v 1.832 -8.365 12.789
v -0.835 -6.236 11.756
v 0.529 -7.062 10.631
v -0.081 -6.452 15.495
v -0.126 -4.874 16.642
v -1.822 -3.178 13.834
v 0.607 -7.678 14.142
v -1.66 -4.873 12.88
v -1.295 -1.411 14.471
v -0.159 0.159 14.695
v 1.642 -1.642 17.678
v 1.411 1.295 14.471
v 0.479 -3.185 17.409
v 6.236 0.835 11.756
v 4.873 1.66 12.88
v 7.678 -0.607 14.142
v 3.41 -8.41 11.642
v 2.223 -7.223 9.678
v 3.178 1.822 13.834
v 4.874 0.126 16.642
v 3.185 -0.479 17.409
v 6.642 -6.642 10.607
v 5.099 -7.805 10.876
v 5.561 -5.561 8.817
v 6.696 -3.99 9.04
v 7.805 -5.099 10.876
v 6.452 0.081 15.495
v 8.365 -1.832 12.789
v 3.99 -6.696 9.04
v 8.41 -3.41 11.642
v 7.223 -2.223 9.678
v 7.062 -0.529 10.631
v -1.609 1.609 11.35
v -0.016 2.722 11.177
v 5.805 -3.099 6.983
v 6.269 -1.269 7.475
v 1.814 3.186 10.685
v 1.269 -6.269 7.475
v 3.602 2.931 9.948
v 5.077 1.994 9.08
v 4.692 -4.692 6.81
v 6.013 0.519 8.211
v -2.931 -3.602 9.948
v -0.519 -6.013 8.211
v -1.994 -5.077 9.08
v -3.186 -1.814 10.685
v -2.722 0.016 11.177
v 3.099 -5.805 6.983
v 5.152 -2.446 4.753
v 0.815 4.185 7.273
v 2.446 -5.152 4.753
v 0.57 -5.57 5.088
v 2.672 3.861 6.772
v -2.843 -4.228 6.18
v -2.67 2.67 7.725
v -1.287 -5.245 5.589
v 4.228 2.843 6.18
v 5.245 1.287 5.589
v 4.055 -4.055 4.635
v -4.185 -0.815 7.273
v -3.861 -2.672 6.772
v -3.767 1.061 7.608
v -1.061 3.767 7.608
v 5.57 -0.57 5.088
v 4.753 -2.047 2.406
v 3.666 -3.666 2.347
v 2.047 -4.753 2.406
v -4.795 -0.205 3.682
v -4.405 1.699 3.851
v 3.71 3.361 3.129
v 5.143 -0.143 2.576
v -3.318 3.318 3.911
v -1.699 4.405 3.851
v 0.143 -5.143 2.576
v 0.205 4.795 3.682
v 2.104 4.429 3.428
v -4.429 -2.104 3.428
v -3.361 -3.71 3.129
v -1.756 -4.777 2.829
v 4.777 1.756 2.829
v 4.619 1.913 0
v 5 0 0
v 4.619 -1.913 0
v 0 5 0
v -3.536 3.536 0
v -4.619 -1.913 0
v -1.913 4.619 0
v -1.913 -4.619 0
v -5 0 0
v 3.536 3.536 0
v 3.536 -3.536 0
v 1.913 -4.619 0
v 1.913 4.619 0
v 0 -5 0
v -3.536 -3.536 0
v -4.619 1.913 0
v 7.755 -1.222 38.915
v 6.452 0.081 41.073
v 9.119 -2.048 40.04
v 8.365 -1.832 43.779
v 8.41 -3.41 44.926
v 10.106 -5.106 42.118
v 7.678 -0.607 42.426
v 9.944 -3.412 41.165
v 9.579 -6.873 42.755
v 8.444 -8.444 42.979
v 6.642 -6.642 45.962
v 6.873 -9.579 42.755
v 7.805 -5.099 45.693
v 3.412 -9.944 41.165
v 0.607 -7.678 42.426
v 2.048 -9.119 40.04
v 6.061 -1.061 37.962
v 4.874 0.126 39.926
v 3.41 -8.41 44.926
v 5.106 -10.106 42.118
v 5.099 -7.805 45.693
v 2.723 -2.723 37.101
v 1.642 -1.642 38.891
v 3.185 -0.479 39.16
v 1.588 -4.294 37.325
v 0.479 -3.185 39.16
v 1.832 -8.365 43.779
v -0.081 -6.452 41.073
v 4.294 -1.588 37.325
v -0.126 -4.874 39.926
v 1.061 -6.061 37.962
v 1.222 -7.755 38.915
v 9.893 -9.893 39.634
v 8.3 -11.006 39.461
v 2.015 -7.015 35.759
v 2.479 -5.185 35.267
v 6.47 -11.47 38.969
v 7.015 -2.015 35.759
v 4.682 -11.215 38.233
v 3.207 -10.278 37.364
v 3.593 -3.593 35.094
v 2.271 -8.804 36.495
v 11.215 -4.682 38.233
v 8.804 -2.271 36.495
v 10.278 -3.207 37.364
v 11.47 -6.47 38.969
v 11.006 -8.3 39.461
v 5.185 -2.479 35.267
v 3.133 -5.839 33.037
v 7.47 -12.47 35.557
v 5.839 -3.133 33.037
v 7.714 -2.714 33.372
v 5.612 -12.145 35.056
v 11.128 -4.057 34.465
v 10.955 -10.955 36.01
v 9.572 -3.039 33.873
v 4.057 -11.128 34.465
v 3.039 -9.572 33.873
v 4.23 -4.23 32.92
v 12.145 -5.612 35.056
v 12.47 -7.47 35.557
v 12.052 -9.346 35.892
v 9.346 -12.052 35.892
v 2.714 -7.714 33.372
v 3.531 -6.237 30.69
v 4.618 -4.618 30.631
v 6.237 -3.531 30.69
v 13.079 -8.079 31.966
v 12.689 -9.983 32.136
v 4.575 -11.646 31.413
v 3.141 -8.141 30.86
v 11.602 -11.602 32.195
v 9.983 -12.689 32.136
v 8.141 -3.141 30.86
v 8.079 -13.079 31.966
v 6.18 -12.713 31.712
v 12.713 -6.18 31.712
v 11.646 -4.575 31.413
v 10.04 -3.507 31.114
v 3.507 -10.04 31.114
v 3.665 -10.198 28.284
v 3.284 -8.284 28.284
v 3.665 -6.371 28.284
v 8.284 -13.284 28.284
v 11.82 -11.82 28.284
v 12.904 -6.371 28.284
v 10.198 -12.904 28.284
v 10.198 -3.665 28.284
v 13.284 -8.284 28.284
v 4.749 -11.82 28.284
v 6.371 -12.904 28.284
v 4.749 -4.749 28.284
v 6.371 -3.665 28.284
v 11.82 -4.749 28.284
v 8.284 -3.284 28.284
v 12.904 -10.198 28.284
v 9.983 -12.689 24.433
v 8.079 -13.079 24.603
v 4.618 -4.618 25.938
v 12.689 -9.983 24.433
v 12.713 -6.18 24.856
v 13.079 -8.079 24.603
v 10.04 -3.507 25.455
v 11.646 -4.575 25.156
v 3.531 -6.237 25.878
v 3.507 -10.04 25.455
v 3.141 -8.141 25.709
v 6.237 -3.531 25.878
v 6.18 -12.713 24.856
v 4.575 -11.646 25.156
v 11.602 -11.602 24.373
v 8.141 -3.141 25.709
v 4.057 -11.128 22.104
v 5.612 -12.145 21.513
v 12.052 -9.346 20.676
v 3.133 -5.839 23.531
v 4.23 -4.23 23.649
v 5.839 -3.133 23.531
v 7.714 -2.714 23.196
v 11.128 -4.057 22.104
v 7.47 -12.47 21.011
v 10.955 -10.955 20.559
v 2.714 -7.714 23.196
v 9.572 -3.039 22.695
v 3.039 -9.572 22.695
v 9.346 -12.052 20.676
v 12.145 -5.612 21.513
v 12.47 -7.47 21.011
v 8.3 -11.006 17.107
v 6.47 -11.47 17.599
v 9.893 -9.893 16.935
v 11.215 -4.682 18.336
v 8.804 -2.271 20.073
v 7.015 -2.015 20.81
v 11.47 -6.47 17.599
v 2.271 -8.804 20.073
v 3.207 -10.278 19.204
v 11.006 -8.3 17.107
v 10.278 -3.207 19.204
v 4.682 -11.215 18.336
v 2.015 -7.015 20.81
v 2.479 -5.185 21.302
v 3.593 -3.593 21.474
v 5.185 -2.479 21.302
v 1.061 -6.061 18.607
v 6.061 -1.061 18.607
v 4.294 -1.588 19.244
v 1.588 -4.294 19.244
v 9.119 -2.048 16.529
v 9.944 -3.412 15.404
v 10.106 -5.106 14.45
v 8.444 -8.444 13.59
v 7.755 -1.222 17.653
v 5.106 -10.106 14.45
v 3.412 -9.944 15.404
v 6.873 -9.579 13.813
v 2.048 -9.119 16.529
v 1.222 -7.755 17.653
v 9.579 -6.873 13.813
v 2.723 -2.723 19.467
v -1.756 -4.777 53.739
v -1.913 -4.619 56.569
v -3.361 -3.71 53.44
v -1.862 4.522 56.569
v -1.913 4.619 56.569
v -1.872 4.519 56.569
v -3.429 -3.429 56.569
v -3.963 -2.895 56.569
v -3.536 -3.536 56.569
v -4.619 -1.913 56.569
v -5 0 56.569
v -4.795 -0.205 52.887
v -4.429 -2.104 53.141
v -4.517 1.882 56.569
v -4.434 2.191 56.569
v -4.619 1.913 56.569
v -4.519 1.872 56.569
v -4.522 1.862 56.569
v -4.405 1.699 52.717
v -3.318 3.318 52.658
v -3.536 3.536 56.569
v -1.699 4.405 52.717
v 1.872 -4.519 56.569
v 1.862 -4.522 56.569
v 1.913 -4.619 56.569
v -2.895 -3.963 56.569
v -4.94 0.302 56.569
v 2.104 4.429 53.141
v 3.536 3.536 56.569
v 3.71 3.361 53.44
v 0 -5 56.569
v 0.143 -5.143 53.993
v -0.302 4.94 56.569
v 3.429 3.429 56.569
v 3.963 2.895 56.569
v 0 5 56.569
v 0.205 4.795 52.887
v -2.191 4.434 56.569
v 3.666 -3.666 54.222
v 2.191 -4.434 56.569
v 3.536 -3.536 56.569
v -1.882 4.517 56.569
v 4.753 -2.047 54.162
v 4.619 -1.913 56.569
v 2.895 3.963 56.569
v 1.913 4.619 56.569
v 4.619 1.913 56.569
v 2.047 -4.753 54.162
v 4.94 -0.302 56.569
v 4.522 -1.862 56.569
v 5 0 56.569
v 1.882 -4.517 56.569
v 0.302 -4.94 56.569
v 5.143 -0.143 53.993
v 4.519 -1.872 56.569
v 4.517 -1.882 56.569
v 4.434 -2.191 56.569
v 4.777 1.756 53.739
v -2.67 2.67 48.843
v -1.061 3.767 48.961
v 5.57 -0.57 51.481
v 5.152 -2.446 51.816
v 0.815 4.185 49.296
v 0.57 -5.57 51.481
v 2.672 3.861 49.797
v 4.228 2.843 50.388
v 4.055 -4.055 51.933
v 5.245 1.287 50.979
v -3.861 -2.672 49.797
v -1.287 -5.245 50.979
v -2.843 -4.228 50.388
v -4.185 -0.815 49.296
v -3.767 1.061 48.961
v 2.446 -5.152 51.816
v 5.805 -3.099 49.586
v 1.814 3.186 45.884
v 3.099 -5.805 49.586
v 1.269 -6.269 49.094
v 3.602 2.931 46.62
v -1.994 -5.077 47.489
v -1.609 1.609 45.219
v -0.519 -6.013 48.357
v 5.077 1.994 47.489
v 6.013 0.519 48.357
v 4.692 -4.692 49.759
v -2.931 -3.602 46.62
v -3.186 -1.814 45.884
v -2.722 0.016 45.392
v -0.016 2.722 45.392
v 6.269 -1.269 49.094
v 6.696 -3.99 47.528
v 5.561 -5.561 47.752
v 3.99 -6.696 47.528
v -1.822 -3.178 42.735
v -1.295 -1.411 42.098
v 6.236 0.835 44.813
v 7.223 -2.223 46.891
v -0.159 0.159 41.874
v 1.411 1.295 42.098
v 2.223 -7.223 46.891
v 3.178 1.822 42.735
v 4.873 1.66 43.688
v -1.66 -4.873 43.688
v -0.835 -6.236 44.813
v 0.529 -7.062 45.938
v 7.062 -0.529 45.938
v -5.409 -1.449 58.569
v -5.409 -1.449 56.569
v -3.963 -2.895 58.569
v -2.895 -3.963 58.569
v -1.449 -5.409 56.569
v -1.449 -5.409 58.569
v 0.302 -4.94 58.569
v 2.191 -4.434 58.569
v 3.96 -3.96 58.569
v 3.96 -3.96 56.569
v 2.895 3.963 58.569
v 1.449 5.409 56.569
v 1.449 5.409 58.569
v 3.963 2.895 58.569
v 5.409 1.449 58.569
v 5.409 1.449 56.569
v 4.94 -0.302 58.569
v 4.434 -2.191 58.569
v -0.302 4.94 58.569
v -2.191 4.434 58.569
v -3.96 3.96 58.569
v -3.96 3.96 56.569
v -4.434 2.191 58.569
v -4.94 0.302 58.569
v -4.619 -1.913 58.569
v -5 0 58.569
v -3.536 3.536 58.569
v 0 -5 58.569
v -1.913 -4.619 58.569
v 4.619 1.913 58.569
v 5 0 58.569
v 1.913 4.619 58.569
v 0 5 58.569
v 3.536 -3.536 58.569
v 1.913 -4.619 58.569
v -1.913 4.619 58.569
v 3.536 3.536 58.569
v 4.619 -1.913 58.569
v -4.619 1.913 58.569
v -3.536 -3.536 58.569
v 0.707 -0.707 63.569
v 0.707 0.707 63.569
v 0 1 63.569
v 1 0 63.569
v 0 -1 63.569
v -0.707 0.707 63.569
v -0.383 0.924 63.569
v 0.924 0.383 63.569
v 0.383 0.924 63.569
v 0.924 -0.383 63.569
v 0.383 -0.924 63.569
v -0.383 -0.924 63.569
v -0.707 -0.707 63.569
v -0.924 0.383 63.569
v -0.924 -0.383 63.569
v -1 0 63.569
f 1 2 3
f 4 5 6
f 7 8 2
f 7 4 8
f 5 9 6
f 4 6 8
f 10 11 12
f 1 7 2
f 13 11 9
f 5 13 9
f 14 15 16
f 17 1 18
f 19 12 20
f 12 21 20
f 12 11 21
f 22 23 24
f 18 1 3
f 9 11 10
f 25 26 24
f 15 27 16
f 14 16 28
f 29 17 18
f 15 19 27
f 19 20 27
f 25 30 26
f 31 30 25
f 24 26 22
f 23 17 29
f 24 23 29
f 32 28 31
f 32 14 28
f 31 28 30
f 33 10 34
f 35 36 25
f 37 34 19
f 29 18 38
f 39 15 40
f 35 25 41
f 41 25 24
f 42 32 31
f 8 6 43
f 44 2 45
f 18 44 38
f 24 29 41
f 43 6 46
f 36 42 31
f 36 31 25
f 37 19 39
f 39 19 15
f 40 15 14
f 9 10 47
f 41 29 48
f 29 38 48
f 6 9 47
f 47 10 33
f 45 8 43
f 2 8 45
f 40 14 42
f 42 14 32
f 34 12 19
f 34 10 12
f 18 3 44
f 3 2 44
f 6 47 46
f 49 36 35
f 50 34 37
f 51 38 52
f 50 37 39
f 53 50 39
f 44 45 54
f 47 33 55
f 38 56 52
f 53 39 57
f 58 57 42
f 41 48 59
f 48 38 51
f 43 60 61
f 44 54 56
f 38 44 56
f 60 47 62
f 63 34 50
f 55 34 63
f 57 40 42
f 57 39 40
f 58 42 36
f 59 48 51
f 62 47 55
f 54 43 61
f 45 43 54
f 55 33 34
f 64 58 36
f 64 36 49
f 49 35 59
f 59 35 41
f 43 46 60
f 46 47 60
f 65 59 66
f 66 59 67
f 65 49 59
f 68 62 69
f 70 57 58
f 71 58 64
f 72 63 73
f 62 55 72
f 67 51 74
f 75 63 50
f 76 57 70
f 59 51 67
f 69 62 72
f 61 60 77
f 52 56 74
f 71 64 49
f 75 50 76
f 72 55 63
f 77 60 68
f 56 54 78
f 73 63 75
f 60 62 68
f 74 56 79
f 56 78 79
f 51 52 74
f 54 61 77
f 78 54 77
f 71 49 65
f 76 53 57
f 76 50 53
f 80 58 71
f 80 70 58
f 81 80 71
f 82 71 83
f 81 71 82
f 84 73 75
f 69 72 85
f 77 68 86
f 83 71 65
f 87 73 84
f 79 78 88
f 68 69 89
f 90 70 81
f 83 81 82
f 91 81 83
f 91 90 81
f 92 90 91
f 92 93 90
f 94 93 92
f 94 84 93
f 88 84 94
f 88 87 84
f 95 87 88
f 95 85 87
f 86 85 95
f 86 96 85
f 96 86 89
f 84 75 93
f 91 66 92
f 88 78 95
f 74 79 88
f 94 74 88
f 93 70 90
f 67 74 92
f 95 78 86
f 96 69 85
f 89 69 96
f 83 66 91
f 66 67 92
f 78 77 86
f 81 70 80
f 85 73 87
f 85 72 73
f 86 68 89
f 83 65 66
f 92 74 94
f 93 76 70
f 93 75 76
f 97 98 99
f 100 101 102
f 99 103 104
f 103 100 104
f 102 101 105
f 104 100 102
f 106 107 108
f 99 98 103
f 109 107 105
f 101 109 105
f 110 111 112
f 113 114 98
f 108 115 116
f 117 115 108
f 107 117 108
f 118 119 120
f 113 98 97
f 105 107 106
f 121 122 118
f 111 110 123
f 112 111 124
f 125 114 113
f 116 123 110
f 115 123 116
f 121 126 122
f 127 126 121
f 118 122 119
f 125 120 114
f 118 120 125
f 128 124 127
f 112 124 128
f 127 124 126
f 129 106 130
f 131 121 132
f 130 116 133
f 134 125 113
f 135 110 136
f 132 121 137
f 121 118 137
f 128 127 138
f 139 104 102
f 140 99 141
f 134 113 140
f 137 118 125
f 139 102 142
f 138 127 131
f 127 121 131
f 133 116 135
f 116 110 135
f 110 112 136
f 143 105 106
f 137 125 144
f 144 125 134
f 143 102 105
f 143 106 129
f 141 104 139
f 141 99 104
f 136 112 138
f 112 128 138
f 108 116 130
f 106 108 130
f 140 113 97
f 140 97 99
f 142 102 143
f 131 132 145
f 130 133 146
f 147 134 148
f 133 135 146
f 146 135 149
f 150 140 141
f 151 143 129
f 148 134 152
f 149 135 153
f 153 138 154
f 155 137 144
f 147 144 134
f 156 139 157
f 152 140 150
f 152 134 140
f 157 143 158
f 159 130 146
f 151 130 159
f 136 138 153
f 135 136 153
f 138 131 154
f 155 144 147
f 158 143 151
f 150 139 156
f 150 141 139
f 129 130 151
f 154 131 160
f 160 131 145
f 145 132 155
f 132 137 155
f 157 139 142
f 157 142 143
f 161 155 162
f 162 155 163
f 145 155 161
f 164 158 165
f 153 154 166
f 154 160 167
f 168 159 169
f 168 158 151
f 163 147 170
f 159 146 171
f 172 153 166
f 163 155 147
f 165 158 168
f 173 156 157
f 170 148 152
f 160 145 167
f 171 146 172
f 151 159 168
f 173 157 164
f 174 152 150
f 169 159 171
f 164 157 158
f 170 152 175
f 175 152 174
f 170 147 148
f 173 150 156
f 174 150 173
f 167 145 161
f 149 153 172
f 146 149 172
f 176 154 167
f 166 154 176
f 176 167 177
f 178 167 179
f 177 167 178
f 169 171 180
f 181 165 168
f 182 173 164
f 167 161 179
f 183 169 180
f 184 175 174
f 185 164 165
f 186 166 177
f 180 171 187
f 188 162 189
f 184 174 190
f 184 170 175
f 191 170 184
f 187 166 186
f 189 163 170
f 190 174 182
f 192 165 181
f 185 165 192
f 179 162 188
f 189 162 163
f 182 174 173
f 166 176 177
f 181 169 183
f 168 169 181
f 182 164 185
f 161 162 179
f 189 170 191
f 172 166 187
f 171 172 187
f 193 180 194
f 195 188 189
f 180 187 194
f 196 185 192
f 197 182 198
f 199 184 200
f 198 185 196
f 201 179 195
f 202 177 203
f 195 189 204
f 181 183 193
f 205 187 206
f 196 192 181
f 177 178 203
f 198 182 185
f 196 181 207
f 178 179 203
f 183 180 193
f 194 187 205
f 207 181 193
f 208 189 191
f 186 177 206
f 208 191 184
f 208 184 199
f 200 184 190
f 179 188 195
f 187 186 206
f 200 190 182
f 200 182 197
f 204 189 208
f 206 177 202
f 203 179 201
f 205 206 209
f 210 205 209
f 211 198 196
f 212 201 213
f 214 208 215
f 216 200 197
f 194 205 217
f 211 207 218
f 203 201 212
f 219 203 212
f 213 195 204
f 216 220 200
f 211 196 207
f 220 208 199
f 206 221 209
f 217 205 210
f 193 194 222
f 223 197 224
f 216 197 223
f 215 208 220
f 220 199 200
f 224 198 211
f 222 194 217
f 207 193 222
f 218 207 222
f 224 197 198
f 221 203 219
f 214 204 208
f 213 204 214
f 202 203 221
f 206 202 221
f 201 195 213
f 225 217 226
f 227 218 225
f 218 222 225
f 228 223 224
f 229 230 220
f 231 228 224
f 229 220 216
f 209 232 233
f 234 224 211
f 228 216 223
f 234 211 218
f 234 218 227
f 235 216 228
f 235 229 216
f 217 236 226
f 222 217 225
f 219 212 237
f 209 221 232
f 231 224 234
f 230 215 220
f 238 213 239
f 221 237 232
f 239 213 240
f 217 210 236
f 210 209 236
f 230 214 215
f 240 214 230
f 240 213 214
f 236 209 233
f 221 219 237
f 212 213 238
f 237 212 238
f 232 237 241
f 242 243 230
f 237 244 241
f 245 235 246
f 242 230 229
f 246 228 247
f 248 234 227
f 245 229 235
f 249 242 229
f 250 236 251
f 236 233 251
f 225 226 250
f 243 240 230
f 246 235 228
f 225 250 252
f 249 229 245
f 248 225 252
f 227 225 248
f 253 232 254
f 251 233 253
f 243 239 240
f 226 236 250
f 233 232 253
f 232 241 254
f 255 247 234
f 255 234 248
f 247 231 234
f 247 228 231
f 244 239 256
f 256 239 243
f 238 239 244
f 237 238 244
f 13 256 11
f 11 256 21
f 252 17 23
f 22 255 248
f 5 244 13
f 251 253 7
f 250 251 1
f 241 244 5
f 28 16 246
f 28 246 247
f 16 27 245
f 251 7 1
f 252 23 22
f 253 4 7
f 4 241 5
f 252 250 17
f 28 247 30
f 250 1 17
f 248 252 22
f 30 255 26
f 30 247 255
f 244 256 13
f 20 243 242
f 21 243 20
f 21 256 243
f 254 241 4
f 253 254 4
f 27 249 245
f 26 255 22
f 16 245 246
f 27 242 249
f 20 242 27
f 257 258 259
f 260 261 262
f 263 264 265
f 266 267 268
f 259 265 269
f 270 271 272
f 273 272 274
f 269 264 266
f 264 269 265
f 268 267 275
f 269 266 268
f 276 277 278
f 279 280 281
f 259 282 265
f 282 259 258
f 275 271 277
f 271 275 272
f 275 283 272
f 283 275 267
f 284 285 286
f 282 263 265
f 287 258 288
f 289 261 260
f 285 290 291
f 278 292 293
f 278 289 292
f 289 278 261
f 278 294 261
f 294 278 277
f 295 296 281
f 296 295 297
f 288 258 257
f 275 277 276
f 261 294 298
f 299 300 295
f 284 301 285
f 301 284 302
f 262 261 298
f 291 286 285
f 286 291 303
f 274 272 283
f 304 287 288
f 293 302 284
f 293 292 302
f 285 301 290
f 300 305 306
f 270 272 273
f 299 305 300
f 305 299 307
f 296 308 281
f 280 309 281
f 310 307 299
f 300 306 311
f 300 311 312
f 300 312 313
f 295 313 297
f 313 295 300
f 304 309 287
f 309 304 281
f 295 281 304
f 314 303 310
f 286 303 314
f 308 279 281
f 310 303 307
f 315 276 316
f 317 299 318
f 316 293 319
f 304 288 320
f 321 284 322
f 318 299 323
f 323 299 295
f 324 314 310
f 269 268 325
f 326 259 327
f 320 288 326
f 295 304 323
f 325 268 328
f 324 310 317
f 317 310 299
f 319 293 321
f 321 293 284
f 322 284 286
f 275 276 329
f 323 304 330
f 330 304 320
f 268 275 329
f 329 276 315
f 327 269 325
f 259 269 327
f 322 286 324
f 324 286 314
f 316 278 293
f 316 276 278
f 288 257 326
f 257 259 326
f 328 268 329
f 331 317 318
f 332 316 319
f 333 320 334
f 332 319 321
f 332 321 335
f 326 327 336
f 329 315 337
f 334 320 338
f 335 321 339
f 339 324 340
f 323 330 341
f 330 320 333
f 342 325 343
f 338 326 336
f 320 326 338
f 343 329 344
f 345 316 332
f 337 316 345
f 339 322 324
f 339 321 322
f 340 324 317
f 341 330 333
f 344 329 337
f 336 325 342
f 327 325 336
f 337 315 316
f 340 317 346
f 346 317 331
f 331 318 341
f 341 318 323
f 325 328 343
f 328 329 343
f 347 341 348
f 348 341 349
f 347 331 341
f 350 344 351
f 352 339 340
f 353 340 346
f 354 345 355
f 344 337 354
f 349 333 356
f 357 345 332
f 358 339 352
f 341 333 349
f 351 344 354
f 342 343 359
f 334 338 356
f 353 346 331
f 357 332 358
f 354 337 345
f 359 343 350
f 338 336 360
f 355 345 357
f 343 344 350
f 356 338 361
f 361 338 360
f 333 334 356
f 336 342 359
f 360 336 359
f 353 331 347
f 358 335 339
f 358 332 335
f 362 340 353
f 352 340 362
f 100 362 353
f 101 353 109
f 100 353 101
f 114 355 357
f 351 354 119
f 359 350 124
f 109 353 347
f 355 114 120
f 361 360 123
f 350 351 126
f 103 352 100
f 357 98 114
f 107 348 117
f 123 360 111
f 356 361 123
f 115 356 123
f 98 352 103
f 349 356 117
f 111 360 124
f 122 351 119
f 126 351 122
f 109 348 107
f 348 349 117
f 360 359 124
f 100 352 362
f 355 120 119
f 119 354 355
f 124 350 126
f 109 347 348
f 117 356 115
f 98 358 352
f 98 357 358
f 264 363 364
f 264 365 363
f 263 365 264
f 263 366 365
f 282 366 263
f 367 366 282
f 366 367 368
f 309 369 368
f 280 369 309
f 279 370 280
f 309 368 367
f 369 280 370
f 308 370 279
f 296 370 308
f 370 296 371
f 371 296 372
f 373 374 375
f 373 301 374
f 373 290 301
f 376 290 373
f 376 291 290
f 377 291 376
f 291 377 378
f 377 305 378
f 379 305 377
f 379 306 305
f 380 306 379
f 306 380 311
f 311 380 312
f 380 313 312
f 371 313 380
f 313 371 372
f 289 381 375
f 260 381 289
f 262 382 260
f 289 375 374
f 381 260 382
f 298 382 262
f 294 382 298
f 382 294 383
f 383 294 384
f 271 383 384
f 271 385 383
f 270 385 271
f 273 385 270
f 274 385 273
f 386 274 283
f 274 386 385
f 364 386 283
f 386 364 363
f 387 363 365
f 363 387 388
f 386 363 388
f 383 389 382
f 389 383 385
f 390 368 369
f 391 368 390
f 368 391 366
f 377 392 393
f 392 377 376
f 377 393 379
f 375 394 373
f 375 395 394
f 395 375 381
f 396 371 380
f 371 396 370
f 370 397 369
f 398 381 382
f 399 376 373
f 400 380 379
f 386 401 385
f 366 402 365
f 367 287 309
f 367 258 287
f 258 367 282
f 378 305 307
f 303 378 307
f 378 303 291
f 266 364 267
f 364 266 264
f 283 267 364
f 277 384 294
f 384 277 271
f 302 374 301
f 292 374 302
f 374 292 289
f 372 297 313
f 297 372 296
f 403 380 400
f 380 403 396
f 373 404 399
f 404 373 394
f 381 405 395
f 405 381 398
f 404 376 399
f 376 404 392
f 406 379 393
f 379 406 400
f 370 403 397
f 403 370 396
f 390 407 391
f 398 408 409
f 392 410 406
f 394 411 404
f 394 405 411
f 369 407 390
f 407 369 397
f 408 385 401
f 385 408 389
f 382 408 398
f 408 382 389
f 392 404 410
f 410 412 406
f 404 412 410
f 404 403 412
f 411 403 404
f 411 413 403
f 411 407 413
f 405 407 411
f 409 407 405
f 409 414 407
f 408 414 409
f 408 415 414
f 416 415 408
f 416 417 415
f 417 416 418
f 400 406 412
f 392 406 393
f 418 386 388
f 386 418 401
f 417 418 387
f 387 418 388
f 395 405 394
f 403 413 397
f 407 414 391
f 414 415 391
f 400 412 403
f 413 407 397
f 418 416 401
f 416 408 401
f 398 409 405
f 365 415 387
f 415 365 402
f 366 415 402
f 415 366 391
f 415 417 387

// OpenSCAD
module select(n)children(n);
module tilt(a=90/8,x=10)
translate([x,0,0])rotate(a,[0,1,0])translate([-x,0,0])children();
module addWedge(a=180,c="red")rotate(a)
    tilt(90/8,10){rotate(-a)children();
    color(c)hull(){cylinder(0.01,5); 
        tilt(-90/8,10)cylinder(0.01,5);}
    tilt(-90.0/16,10)translate([-5,0,0])
        cube([0.5,0.5,3.1],center=true);}  
module addElbow(angel=45,delta=10,br=20,r="",r1=5,r2=5,c="green",n=0){
    n=round(angel/delta+0.5);
    delta=angel/n;
    r1=r!=""?r:r1;
    r2=r!=""?r:r2;   
    dr=(r2-r1)/n; 
    translate([br,0,0])rotate(angel,[0,1,0]){
        color(c)
        for(i=[0:n-1])hull()
          for (j=[i:i+1]) 
              rotate(-delta*j,[0,1,0])translate([-br,0,0])
              cylinder(0.01,r1=r1+dr*j);
        translate([-br,0,0])children();
        }
     }
module addMarker(b=90){
    rotate(b)rotate(-90,[0,1,0])cylinder(20,center=true,$fn=9);
    children();}
module addDoubleWedge(a=0,b=90,c="green")
    addWedge(a=a,c=c)addMarker(b+a)addWedge(a=a,c=c)
    children();
module Nozzle(){
    cylinder(h=2,r=5.6,$fn=6);
    translate([0,0,2])cylinder(h=5,r1=5,r2=1);}
module selection(i)select(i){addWedge()children();
    addDoubleWedge()children();
    addMarker()children();}
    
module selection1(i)
    if (i==0) addWedge()children();
    else if(i==1) addDoubleWedge()children();
    else if(i==2) addMarker()children();
    else if(i==3) addTube()children();
    else children();
        
 rotate(-45)addElbow(45,c="red")rotate(180)addElbow(90,c="red")rotate(180)addElbow()Nozzle(); 
 
*for (i=[-1:3])translate([10*i,0,0])selection1(i)Nozzle();
